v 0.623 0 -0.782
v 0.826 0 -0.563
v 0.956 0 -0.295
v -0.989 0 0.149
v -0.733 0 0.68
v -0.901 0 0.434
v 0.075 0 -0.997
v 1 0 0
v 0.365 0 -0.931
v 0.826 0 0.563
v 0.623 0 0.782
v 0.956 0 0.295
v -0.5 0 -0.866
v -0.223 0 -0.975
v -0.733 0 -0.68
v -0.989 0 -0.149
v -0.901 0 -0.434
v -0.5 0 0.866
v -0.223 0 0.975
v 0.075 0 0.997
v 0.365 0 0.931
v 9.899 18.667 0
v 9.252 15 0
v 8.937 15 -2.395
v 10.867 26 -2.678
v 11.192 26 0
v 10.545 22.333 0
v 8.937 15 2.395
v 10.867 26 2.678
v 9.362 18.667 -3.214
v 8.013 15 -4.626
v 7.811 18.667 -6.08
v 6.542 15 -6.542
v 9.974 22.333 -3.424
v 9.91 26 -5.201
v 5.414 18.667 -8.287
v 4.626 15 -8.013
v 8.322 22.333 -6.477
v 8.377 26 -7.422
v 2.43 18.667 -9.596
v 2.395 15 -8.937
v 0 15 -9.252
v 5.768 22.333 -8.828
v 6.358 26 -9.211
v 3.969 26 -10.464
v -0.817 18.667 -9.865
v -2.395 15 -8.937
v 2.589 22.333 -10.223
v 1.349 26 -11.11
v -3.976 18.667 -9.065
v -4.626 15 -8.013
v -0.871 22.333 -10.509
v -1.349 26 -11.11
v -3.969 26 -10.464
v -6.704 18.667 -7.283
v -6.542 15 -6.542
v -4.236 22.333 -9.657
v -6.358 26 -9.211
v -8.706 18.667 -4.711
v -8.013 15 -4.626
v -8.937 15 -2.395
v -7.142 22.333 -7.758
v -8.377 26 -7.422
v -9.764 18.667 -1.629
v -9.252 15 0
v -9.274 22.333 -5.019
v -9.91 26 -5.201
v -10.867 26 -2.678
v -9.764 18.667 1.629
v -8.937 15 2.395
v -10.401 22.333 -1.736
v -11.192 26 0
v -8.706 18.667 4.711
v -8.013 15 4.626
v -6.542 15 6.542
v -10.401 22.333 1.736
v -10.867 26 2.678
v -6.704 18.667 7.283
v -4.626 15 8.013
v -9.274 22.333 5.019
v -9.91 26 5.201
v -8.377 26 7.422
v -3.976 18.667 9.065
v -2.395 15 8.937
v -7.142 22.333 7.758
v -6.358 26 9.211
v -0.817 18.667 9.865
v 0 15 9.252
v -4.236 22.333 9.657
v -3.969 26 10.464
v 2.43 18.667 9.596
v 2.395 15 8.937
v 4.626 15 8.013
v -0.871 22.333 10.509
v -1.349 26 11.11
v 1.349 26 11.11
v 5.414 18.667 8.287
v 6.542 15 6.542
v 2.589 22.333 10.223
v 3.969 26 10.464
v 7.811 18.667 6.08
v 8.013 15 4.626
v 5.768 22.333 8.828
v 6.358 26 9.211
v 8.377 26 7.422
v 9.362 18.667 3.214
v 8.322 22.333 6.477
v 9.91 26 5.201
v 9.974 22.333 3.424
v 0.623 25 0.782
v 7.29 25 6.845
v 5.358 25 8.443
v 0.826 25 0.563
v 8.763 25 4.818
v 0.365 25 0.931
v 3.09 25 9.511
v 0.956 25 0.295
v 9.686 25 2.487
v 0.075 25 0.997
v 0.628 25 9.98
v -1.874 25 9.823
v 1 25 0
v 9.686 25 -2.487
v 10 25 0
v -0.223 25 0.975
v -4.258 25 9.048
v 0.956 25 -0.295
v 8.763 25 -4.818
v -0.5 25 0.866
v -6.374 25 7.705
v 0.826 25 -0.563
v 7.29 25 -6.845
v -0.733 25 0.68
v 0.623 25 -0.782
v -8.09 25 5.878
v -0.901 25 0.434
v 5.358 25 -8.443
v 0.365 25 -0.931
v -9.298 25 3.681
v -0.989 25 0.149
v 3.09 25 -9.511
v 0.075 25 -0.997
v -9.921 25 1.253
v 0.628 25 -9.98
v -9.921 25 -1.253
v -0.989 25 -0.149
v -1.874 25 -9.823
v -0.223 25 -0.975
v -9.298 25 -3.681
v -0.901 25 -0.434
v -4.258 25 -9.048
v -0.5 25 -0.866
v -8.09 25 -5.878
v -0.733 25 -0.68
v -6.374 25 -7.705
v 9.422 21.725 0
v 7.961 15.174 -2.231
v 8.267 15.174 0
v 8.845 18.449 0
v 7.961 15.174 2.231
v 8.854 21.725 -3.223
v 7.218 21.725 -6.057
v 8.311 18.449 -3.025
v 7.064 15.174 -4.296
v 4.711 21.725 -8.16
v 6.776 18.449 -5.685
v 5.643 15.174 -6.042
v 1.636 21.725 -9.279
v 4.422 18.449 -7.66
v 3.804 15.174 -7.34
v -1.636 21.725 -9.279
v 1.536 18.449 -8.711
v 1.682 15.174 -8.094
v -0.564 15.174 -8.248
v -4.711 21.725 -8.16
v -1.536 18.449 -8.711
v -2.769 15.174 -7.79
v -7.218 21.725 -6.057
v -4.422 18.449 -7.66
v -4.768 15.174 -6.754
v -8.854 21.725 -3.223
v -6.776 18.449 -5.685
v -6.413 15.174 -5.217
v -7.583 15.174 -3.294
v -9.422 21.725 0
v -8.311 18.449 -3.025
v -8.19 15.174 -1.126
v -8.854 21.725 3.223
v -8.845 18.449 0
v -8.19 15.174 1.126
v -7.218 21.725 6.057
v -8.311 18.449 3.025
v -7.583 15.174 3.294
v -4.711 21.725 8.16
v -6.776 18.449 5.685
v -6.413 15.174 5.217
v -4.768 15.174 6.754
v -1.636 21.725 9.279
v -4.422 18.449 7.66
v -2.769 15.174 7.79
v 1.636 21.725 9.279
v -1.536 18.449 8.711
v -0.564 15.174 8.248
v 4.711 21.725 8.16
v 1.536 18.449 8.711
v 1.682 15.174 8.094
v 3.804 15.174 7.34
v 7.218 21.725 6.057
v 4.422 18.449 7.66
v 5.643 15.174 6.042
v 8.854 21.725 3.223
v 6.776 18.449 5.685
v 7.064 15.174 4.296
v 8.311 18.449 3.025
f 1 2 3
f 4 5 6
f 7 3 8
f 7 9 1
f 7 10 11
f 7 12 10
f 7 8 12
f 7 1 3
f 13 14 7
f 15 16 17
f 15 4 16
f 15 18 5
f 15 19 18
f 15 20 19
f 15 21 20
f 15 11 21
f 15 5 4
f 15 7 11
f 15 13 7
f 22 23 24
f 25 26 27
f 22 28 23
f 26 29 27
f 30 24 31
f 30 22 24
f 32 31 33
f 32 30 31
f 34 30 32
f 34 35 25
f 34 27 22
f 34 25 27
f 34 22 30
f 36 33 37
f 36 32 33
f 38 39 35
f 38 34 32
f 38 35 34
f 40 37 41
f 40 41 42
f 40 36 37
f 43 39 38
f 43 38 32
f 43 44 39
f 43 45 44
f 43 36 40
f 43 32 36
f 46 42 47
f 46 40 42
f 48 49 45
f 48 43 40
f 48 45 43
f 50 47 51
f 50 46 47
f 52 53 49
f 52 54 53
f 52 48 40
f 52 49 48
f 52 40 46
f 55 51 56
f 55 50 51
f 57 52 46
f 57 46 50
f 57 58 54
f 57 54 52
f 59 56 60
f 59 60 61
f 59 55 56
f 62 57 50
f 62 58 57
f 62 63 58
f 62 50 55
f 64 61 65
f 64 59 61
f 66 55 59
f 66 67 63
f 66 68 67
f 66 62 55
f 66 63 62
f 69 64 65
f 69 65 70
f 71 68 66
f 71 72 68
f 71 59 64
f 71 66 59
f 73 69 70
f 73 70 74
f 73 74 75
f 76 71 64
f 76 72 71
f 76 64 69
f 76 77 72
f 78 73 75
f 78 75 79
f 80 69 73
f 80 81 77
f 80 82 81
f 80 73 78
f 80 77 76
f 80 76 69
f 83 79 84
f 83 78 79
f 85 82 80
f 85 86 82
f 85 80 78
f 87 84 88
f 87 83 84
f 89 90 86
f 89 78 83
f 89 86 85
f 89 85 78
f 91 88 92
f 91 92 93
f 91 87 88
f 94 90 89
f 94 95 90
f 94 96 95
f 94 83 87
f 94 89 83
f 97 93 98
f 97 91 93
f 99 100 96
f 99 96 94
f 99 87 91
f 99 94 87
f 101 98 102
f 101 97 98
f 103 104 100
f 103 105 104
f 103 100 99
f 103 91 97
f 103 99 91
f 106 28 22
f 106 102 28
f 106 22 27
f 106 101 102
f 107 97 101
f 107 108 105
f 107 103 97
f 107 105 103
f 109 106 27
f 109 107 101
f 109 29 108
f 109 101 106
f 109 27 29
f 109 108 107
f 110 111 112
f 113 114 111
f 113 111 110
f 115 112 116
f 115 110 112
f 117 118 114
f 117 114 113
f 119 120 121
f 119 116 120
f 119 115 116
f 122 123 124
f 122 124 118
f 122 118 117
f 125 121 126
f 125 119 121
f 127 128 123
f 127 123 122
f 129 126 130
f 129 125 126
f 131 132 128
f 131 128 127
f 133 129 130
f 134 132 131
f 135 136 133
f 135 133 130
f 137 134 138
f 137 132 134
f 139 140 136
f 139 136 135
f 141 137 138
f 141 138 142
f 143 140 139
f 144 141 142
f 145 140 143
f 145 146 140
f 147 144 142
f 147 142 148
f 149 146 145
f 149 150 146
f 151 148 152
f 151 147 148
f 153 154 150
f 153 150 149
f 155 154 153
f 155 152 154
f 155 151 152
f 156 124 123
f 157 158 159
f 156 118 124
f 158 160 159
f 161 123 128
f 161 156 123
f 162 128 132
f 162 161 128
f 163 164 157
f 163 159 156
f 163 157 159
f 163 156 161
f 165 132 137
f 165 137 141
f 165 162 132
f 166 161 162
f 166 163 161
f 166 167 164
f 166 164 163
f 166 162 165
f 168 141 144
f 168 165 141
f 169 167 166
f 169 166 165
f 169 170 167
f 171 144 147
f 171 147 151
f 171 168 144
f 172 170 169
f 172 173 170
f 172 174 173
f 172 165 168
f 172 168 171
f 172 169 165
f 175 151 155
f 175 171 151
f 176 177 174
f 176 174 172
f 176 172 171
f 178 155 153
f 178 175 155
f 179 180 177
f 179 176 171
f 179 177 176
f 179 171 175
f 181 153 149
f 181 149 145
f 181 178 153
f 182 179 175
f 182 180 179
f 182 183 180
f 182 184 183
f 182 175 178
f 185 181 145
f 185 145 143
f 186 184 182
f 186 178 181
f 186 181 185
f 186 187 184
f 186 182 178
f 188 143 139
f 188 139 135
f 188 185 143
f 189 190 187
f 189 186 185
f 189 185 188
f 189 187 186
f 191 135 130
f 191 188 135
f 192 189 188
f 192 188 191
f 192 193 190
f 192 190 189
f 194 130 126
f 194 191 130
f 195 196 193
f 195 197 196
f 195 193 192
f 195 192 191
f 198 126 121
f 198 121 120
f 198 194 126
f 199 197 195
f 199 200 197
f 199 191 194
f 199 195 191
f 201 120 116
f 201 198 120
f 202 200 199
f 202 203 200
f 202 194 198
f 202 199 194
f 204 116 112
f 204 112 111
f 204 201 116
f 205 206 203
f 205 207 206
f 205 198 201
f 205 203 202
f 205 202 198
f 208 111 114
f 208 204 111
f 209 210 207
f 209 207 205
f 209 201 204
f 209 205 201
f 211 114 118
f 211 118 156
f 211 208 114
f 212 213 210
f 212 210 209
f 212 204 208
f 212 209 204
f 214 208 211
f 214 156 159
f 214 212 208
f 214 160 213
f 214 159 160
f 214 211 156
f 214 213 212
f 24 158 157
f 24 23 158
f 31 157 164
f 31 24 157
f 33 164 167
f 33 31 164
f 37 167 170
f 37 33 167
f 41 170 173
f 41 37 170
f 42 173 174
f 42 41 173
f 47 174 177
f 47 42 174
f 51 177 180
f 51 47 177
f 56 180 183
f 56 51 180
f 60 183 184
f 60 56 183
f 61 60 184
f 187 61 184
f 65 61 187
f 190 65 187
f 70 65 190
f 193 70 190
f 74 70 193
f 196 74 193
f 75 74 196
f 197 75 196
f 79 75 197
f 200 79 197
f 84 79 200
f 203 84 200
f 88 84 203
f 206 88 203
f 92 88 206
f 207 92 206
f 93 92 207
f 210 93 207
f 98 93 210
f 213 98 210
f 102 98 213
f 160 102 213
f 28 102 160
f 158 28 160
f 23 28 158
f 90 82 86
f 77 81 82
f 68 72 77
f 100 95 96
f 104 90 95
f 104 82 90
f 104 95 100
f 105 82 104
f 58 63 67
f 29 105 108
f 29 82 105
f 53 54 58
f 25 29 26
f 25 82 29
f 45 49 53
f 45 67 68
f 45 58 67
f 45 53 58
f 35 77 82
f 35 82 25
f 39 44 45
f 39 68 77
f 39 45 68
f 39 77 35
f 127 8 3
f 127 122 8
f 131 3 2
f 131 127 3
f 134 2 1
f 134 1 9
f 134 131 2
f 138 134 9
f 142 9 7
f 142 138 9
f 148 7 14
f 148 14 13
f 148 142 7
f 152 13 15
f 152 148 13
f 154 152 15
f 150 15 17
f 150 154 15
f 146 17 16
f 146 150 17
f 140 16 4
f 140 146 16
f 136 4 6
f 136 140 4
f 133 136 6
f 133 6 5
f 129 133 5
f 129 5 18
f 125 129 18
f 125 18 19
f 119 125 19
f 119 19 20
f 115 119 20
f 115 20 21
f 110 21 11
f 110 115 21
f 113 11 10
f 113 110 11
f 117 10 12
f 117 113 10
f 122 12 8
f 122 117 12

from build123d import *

# Parameters (mm, degrees)
SKETCH1_W = 1
SKETCH1_H = 25


with BuildPart() as part:
    # Sketch1 → Revolve1 (revolve)
    with BuildSketch(Plane.XY):
        with Locations((0.5, 12.5)):
            Rectangle(SKETCH1_W, SKETCH1_H)
    revolve(axis=Axis((0, 0, 0), (0, 1, 0)))

    # Sketch2 → Revolve2 (revolve)
    with BuildSketch(Plane.XY):
        Polygon((0, 25), (10, 25), (8.267349052, 15.173648178), (9.252156805, 15), (11.191753593, 26), (0, 26), align=None)
    revolve(axis=Axis((0, 0, 0), (0, 1, 0)))


solid = part.part
